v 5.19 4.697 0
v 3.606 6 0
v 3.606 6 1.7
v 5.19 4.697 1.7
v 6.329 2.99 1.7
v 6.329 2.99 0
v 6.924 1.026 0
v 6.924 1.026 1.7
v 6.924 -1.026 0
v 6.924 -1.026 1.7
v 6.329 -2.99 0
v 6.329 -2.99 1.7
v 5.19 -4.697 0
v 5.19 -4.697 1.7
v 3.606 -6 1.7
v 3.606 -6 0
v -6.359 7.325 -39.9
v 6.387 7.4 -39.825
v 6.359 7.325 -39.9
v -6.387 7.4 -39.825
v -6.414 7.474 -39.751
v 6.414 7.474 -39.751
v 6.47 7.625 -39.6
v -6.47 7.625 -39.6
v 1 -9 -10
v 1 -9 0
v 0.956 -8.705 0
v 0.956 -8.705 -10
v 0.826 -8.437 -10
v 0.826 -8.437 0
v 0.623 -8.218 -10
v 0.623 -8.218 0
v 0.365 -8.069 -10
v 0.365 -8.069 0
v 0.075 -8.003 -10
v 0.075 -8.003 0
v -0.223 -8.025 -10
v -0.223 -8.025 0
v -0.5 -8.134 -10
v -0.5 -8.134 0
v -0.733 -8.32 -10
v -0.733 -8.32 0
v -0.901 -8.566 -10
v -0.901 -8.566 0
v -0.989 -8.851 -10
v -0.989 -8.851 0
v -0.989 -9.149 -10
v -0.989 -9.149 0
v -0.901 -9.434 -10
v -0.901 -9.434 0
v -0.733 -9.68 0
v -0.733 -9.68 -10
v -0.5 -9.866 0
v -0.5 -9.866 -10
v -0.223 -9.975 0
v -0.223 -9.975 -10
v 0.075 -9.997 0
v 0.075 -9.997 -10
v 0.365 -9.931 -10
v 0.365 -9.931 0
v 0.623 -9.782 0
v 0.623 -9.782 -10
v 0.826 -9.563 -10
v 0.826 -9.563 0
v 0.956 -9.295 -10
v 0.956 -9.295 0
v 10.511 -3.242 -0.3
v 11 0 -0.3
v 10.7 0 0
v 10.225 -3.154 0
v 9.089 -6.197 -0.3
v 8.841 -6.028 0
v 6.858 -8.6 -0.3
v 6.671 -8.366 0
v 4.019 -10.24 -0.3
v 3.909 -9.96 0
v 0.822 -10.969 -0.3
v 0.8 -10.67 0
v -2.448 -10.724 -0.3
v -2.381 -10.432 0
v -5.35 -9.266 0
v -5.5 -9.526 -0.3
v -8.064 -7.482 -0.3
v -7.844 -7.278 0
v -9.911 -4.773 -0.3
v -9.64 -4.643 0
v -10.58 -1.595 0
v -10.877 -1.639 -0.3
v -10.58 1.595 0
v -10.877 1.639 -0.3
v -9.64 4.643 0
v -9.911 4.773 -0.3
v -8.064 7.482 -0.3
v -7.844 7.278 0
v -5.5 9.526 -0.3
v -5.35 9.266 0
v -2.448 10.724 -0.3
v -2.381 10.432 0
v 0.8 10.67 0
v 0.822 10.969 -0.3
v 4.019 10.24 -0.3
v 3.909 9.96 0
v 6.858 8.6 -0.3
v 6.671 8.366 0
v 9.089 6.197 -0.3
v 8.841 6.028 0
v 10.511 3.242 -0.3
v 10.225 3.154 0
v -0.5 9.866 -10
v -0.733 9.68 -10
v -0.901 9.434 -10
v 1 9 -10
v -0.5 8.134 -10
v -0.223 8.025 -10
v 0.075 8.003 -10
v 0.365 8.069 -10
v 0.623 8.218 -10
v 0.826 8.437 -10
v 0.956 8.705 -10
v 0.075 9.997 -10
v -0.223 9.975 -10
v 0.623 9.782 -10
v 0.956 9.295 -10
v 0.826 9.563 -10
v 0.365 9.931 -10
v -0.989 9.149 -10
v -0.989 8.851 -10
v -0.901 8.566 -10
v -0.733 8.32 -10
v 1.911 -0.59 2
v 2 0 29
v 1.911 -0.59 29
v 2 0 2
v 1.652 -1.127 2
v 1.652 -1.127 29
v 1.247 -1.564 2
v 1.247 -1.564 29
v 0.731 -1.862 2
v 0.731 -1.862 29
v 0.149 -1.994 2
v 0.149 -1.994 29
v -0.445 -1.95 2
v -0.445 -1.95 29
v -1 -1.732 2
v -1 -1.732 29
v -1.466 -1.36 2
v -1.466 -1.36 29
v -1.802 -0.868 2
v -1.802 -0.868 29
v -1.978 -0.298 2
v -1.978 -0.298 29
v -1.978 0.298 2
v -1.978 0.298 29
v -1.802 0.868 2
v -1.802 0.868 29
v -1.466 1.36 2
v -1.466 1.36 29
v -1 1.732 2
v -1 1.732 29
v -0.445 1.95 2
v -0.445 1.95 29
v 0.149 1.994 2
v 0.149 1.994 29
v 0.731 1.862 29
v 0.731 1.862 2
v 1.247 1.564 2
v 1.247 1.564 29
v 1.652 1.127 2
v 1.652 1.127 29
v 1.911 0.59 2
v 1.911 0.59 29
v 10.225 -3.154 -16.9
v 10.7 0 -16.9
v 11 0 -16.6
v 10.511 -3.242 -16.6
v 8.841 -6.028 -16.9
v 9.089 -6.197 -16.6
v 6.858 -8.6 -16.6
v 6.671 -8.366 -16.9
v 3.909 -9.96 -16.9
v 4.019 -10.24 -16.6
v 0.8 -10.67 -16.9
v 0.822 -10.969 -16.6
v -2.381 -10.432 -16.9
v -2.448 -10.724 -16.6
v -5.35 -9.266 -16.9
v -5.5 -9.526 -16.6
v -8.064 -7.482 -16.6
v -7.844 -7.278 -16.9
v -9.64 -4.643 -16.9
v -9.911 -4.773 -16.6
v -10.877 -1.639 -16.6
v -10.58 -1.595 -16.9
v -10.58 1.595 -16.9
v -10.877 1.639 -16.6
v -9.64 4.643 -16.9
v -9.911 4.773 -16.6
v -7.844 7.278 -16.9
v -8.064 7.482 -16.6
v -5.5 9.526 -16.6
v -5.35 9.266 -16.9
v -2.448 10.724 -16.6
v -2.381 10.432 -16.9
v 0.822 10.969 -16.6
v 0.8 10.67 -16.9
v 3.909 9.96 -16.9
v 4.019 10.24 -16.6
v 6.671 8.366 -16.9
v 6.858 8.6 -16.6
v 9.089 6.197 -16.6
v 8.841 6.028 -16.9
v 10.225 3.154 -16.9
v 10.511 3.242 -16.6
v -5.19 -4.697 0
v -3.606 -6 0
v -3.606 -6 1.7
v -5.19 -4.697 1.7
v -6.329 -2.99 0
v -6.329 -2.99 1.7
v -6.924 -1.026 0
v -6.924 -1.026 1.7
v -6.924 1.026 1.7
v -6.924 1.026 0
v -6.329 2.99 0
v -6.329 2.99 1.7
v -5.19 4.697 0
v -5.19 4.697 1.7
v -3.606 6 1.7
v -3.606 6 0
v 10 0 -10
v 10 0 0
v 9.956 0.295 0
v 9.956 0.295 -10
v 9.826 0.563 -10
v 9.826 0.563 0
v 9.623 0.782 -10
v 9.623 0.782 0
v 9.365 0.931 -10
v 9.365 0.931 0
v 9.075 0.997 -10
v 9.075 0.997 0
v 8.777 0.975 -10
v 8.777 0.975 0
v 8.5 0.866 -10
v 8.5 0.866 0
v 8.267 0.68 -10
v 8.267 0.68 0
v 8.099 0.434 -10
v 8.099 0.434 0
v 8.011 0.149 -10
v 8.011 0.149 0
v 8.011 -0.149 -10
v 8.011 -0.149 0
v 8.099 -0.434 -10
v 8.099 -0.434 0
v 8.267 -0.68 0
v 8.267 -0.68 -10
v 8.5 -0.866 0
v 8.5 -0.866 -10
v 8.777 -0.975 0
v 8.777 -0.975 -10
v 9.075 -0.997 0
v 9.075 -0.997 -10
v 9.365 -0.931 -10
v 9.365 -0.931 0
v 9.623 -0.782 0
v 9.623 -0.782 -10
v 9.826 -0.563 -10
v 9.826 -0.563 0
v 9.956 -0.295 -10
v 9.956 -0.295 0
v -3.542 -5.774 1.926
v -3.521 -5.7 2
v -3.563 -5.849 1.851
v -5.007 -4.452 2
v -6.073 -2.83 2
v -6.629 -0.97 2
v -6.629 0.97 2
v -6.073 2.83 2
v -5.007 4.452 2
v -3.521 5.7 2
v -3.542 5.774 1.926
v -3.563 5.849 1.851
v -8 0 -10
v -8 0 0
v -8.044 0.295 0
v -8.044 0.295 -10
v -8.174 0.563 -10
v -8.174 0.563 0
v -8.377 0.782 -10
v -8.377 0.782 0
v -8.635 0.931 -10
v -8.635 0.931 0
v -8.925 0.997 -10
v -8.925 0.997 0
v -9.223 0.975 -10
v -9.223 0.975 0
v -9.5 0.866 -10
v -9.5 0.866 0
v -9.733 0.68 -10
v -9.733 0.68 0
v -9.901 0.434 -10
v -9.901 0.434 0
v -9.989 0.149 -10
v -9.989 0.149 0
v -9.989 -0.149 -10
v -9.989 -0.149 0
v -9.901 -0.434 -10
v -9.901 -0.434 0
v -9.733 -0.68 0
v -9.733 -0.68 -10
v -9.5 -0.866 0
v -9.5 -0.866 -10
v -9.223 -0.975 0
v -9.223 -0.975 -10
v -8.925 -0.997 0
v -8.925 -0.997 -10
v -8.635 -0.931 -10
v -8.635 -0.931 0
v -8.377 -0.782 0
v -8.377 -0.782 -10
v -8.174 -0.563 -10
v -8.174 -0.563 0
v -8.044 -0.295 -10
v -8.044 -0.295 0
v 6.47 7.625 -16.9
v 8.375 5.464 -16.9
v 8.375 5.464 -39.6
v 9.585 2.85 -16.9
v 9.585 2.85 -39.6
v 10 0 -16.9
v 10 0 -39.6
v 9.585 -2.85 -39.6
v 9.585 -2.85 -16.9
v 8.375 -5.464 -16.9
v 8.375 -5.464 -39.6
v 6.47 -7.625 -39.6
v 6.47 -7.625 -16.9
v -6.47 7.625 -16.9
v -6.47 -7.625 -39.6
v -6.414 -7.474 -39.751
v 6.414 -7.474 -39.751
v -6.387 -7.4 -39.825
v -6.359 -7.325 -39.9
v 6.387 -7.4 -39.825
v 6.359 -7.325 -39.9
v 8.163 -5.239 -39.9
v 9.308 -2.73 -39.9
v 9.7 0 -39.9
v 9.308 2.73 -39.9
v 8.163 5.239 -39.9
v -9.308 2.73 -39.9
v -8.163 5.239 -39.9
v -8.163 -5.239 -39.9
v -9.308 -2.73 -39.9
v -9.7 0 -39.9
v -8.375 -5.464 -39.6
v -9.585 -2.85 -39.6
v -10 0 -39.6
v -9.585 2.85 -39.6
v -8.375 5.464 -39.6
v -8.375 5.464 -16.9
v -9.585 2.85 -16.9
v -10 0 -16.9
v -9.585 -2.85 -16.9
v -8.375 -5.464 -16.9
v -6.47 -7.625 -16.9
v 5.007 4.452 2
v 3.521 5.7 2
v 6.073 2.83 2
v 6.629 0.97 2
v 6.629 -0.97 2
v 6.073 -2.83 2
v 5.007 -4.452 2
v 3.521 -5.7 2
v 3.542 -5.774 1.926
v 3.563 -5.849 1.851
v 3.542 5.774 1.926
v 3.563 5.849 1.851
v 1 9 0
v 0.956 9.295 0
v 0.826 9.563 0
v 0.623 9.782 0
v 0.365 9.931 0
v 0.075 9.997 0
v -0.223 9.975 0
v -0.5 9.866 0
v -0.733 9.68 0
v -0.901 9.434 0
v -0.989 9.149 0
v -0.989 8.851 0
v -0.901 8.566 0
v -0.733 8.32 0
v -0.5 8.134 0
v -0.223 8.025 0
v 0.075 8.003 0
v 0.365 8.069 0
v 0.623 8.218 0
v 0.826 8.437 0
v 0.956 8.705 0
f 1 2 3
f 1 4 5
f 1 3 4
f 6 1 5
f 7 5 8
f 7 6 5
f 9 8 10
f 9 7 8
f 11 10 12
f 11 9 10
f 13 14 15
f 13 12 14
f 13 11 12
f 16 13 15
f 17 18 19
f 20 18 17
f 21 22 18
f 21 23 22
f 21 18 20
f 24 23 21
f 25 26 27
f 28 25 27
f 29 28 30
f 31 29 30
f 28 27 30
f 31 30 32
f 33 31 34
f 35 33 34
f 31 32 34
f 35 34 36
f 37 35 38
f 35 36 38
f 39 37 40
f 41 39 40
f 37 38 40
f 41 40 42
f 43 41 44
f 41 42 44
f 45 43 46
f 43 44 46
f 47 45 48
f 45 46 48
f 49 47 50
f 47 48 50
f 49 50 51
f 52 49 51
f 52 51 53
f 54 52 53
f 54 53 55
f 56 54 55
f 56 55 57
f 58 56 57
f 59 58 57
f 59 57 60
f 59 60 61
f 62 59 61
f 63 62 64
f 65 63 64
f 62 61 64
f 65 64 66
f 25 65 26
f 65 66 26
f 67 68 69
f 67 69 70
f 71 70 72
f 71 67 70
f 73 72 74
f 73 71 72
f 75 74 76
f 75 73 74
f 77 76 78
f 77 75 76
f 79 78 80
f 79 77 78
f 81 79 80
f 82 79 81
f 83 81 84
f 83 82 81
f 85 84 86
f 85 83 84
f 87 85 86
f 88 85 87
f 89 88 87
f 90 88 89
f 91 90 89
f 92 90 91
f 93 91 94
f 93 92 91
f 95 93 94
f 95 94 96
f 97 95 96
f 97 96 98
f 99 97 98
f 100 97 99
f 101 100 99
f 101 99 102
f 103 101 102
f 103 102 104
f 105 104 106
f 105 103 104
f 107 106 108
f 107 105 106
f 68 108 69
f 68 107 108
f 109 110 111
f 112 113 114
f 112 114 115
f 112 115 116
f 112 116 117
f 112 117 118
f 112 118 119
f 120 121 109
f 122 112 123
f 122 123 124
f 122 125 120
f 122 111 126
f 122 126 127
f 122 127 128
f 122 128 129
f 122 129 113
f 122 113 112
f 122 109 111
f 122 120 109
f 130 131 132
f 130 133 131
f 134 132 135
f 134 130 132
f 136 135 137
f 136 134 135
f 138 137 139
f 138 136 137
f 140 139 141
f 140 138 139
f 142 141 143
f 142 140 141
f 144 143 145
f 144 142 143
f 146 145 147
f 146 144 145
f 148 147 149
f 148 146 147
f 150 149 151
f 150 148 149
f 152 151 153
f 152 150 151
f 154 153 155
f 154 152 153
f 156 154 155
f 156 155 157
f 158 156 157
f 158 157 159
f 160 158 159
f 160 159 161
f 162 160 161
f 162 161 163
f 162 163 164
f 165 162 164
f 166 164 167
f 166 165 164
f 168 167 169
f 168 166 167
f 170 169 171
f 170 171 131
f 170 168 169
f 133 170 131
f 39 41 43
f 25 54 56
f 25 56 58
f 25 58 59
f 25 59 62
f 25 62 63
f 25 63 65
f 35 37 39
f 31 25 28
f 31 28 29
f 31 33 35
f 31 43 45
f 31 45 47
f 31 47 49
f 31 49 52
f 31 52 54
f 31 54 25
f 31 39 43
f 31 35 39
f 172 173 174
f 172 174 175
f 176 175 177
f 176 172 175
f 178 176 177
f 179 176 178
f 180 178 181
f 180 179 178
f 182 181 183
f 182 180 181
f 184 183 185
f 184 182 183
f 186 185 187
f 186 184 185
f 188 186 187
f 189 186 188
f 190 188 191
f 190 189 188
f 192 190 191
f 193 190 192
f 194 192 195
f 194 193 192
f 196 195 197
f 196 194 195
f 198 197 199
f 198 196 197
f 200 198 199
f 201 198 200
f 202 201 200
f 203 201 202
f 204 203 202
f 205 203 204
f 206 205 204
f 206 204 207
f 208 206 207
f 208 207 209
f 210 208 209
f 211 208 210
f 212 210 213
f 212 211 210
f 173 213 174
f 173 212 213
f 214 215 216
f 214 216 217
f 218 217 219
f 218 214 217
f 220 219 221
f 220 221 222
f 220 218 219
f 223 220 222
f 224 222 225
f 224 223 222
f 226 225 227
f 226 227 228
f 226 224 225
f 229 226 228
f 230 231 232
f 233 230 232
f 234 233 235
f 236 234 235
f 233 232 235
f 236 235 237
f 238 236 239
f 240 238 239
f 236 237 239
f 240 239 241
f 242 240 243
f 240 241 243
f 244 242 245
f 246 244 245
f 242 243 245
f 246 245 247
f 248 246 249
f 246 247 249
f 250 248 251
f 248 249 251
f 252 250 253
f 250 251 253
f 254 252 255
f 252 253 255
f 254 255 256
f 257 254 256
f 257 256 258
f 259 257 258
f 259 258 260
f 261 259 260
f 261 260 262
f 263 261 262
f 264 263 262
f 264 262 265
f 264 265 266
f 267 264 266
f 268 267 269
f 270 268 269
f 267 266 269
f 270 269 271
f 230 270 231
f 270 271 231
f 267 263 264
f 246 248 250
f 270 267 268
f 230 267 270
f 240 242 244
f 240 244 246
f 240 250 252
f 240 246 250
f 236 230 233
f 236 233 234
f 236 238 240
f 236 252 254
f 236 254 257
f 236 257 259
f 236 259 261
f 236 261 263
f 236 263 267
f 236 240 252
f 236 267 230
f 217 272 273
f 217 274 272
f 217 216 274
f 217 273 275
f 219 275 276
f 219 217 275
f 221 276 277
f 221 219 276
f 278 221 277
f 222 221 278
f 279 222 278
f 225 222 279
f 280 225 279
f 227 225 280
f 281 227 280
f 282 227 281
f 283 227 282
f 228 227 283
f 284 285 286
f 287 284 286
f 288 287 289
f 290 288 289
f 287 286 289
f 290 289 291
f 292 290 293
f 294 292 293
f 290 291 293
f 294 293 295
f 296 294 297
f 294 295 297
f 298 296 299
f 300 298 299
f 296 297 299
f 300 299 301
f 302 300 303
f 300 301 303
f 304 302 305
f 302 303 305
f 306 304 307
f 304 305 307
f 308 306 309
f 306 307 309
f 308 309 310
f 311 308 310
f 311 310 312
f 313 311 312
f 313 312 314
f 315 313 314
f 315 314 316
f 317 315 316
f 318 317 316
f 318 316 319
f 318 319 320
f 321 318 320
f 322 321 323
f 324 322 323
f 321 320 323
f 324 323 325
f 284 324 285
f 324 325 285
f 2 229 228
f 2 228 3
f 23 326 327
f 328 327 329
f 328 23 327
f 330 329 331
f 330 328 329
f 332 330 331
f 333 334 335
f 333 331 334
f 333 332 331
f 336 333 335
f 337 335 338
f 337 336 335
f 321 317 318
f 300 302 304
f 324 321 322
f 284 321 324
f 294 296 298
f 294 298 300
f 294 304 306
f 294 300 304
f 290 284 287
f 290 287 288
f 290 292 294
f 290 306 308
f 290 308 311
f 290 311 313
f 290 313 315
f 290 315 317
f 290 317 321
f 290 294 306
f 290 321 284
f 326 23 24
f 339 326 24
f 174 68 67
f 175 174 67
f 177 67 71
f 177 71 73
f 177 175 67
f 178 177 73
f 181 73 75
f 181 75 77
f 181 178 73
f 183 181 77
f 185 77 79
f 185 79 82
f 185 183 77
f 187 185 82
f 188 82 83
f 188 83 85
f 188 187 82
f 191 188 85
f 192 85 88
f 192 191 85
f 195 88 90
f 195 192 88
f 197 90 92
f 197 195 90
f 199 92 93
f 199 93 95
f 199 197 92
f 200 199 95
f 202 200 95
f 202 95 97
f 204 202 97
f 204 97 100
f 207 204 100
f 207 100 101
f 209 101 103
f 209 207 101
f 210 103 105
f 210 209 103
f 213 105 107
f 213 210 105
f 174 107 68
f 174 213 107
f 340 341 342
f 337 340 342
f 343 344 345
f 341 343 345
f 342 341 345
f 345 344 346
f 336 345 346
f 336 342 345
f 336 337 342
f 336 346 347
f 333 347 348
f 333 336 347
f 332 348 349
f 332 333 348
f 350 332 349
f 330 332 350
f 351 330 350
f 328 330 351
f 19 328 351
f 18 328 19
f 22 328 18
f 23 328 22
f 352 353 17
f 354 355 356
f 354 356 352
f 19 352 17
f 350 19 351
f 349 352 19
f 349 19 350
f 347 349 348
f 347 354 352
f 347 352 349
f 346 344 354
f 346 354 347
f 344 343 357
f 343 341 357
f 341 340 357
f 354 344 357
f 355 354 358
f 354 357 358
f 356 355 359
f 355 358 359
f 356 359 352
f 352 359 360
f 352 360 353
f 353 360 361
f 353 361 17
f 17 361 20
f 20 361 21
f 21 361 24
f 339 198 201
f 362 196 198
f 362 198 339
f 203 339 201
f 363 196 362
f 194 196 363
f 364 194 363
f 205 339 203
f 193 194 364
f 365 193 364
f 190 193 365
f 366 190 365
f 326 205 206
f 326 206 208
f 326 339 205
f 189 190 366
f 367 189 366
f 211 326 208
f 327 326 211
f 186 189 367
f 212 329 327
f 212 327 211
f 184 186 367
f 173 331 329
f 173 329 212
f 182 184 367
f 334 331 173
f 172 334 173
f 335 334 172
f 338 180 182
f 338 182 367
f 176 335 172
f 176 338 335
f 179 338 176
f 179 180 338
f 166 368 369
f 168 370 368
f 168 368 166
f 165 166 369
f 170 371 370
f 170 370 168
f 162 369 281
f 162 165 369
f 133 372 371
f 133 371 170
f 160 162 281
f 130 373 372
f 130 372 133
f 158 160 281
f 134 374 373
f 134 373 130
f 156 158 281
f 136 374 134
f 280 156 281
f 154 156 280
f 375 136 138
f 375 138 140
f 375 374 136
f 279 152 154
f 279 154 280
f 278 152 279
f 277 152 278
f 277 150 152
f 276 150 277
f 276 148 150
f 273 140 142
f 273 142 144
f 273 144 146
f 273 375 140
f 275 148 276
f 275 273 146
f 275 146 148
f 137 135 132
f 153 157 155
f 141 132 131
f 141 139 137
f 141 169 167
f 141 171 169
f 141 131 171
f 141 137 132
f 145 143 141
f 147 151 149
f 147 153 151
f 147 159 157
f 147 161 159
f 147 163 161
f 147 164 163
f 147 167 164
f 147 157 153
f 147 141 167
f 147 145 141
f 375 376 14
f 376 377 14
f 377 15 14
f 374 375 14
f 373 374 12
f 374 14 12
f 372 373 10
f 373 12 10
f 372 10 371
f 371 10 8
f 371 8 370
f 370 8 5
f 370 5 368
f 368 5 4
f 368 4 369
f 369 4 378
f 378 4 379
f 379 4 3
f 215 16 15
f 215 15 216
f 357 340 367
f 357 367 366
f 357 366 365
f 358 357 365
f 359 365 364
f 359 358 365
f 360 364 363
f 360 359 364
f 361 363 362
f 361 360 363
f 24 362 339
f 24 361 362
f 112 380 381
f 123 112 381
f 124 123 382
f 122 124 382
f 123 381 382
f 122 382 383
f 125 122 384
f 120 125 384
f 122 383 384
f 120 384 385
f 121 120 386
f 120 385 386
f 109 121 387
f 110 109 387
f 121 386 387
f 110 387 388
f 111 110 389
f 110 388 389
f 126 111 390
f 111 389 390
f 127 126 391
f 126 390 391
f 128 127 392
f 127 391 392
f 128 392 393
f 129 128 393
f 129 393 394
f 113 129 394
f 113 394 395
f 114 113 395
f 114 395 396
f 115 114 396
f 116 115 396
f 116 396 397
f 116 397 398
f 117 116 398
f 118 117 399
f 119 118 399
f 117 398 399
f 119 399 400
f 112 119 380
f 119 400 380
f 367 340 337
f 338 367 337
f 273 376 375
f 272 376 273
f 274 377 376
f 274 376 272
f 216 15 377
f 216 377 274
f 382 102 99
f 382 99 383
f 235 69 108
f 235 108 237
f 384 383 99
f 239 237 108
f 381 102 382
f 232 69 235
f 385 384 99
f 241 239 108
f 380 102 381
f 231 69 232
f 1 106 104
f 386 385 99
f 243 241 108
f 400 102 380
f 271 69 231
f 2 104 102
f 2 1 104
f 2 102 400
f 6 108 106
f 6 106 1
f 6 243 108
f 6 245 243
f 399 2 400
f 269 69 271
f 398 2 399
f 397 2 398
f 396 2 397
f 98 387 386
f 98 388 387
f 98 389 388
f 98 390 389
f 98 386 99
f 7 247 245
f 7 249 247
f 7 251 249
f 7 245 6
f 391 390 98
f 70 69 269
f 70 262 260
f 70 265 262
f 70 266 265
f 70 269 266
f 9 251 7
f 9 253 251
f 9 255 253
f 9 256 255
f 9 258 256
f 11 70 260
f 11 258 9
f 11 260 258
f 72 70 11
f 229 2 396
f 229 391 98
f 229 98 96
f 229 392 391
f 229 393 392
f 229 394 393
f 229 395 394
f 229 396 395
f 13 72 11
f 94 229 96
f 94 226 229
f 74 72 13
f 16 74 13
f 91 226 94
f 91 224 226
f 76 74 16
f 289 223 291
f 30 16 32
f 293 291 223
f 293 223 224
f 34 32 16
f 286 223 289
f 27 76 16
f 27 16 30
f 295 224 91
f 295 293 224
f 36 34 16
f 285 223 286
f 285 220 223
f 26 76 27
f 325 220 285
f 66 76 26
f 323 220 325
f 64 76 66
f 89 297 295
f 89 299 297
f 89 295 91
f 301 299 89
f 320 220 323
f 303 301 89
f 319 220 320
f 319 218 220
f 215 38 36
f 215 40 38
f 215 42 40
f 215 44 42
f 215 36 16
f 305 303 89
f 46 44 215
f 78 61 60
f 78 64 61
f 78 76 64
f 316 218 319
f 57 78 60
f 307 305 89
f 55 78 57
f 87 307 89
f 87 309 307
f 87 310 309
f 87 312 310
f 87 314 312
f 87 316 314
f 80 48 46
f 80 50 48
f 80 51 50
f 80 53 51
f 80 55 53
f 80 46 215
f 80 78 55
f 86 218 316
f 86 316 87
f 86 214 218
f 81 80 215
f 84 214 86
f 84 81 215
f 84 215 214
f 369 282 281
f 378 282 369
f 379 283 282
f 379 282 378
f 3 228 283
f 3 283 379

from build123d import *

# Parameters (mm, degrees)
CUT_EXTRUDE1_DEPTH = 23
SKETCH3_R          = 1
CUT_EXTRUDE2_DEPTH = 10
CUT_EXTRUDE3_START = -2
CUT_EXTRUDE3_DEPTH = 2
CHAMFER1_SIZE      = 0.3


with BuildPart() as part:
    # Sketch1 → Revolve1 (revolve)
    with BuildSketch(Plane(origin=(0, 0, 0), x_dir=(1, 0, 0), z_dir=(0, 1, 0)), mode=Mode.PRIVATE) as revolve1_sk:
        Polygon((-2, -29), (-2, -2), (-7, -2), (-7, 0), (-11, 0), (-11, 16.9), (-10, 16.9), (-10, 39.9), (0, 39.9), (0, -29), align=None)
    revolve(revolve1_sk.sketch.rotate(Axis((0, 0, -0.287466161), (0, 0, -1)), 180), axis=Axis((0, 0, -0.287466161), (0, 0, -1)))

    # Sketch2 → Cut-Extrude1 (cut)
    with BuildSketch(Plane(origin=(0, 0, -39.9), x_dir=(-1, 0, 0), z_dir=(0, 0, -1))):
        with BuildLine():
            ThreePointArc((6.469882147, 7.625), (0, 10), (-6.469882147, 7.625))
            Line((-6.469882147, 7.625), (6.469882147, 7.625))
        make_face()
        with BuildLine():
            Line((6.469882147, -7.625), (-6.469882147, -7.625))
            ThreePointArc((-6.469882147, -7.625), (0, -10), (6.469882147, -7.625))
        make_face()
    extrude(amount=-CUT_EXTRUDE1_DEPTH, mode=Mode.SUBTRACT)

    # Sketch3 → Cut-Extrude2 (cut)
    with BuildSketch(Plane.XY):
        with Locations((0, 9)):
            Circle(SKETCH3_R)
        with Locations((9, 0)):
            Circle(SKETCH3_R)
        with Locations((0, -9)):
            Circle(SKETCH3_R)
        with Locations((-9, 0)):
            Circle(SKETCH3_R)
    extrude(amount=-CUT_EXTRUDE2_DEPTH, mode=Mode.SUBTRACT)

    # Sketch4 → Cut-Extrude3 (cut)
    with BuildSketch(Plane.XY.offset(2).offset(CUT_EXTRUDE3_START)):
        with BuildLine():
            ThreePointArc((3.605551275, 6), (0, 7), (-3.605551275, 6))
            Line((-3.605551275, 6), (3.605551275, 6))
        make_face()
        with BuildLine():
            Line((3.605551275, -6), (-3.605551275, -6))
            ThreePointArc((-3.605551275, -6), (0, -7), (3.605551275, -6))
        make_face()
    extrude(amount=CUT_EXTRUDE3_DEPTH, mode=Mode.SUBTRACT)

    # Chamfer1
    chamfer1_edges = [part.edges().sort_by_distance(p)[0] for p in [
        (-11, 0, 0),
        (-10, 0, -39.9),
        (10, 0, -39.9),
        (0, 7.625, -39.9),
        (0, -7.625, -39.9),
        (-7, 0, 2),
        (7, 0, 2),
        (0, 6, 2),
        (0, -6, 2),
        (-11, 0, -16.9),
    ]]
    chamfer(chamfer1_edges, length=CHAMFER1_SIZE)


solid = part.part
